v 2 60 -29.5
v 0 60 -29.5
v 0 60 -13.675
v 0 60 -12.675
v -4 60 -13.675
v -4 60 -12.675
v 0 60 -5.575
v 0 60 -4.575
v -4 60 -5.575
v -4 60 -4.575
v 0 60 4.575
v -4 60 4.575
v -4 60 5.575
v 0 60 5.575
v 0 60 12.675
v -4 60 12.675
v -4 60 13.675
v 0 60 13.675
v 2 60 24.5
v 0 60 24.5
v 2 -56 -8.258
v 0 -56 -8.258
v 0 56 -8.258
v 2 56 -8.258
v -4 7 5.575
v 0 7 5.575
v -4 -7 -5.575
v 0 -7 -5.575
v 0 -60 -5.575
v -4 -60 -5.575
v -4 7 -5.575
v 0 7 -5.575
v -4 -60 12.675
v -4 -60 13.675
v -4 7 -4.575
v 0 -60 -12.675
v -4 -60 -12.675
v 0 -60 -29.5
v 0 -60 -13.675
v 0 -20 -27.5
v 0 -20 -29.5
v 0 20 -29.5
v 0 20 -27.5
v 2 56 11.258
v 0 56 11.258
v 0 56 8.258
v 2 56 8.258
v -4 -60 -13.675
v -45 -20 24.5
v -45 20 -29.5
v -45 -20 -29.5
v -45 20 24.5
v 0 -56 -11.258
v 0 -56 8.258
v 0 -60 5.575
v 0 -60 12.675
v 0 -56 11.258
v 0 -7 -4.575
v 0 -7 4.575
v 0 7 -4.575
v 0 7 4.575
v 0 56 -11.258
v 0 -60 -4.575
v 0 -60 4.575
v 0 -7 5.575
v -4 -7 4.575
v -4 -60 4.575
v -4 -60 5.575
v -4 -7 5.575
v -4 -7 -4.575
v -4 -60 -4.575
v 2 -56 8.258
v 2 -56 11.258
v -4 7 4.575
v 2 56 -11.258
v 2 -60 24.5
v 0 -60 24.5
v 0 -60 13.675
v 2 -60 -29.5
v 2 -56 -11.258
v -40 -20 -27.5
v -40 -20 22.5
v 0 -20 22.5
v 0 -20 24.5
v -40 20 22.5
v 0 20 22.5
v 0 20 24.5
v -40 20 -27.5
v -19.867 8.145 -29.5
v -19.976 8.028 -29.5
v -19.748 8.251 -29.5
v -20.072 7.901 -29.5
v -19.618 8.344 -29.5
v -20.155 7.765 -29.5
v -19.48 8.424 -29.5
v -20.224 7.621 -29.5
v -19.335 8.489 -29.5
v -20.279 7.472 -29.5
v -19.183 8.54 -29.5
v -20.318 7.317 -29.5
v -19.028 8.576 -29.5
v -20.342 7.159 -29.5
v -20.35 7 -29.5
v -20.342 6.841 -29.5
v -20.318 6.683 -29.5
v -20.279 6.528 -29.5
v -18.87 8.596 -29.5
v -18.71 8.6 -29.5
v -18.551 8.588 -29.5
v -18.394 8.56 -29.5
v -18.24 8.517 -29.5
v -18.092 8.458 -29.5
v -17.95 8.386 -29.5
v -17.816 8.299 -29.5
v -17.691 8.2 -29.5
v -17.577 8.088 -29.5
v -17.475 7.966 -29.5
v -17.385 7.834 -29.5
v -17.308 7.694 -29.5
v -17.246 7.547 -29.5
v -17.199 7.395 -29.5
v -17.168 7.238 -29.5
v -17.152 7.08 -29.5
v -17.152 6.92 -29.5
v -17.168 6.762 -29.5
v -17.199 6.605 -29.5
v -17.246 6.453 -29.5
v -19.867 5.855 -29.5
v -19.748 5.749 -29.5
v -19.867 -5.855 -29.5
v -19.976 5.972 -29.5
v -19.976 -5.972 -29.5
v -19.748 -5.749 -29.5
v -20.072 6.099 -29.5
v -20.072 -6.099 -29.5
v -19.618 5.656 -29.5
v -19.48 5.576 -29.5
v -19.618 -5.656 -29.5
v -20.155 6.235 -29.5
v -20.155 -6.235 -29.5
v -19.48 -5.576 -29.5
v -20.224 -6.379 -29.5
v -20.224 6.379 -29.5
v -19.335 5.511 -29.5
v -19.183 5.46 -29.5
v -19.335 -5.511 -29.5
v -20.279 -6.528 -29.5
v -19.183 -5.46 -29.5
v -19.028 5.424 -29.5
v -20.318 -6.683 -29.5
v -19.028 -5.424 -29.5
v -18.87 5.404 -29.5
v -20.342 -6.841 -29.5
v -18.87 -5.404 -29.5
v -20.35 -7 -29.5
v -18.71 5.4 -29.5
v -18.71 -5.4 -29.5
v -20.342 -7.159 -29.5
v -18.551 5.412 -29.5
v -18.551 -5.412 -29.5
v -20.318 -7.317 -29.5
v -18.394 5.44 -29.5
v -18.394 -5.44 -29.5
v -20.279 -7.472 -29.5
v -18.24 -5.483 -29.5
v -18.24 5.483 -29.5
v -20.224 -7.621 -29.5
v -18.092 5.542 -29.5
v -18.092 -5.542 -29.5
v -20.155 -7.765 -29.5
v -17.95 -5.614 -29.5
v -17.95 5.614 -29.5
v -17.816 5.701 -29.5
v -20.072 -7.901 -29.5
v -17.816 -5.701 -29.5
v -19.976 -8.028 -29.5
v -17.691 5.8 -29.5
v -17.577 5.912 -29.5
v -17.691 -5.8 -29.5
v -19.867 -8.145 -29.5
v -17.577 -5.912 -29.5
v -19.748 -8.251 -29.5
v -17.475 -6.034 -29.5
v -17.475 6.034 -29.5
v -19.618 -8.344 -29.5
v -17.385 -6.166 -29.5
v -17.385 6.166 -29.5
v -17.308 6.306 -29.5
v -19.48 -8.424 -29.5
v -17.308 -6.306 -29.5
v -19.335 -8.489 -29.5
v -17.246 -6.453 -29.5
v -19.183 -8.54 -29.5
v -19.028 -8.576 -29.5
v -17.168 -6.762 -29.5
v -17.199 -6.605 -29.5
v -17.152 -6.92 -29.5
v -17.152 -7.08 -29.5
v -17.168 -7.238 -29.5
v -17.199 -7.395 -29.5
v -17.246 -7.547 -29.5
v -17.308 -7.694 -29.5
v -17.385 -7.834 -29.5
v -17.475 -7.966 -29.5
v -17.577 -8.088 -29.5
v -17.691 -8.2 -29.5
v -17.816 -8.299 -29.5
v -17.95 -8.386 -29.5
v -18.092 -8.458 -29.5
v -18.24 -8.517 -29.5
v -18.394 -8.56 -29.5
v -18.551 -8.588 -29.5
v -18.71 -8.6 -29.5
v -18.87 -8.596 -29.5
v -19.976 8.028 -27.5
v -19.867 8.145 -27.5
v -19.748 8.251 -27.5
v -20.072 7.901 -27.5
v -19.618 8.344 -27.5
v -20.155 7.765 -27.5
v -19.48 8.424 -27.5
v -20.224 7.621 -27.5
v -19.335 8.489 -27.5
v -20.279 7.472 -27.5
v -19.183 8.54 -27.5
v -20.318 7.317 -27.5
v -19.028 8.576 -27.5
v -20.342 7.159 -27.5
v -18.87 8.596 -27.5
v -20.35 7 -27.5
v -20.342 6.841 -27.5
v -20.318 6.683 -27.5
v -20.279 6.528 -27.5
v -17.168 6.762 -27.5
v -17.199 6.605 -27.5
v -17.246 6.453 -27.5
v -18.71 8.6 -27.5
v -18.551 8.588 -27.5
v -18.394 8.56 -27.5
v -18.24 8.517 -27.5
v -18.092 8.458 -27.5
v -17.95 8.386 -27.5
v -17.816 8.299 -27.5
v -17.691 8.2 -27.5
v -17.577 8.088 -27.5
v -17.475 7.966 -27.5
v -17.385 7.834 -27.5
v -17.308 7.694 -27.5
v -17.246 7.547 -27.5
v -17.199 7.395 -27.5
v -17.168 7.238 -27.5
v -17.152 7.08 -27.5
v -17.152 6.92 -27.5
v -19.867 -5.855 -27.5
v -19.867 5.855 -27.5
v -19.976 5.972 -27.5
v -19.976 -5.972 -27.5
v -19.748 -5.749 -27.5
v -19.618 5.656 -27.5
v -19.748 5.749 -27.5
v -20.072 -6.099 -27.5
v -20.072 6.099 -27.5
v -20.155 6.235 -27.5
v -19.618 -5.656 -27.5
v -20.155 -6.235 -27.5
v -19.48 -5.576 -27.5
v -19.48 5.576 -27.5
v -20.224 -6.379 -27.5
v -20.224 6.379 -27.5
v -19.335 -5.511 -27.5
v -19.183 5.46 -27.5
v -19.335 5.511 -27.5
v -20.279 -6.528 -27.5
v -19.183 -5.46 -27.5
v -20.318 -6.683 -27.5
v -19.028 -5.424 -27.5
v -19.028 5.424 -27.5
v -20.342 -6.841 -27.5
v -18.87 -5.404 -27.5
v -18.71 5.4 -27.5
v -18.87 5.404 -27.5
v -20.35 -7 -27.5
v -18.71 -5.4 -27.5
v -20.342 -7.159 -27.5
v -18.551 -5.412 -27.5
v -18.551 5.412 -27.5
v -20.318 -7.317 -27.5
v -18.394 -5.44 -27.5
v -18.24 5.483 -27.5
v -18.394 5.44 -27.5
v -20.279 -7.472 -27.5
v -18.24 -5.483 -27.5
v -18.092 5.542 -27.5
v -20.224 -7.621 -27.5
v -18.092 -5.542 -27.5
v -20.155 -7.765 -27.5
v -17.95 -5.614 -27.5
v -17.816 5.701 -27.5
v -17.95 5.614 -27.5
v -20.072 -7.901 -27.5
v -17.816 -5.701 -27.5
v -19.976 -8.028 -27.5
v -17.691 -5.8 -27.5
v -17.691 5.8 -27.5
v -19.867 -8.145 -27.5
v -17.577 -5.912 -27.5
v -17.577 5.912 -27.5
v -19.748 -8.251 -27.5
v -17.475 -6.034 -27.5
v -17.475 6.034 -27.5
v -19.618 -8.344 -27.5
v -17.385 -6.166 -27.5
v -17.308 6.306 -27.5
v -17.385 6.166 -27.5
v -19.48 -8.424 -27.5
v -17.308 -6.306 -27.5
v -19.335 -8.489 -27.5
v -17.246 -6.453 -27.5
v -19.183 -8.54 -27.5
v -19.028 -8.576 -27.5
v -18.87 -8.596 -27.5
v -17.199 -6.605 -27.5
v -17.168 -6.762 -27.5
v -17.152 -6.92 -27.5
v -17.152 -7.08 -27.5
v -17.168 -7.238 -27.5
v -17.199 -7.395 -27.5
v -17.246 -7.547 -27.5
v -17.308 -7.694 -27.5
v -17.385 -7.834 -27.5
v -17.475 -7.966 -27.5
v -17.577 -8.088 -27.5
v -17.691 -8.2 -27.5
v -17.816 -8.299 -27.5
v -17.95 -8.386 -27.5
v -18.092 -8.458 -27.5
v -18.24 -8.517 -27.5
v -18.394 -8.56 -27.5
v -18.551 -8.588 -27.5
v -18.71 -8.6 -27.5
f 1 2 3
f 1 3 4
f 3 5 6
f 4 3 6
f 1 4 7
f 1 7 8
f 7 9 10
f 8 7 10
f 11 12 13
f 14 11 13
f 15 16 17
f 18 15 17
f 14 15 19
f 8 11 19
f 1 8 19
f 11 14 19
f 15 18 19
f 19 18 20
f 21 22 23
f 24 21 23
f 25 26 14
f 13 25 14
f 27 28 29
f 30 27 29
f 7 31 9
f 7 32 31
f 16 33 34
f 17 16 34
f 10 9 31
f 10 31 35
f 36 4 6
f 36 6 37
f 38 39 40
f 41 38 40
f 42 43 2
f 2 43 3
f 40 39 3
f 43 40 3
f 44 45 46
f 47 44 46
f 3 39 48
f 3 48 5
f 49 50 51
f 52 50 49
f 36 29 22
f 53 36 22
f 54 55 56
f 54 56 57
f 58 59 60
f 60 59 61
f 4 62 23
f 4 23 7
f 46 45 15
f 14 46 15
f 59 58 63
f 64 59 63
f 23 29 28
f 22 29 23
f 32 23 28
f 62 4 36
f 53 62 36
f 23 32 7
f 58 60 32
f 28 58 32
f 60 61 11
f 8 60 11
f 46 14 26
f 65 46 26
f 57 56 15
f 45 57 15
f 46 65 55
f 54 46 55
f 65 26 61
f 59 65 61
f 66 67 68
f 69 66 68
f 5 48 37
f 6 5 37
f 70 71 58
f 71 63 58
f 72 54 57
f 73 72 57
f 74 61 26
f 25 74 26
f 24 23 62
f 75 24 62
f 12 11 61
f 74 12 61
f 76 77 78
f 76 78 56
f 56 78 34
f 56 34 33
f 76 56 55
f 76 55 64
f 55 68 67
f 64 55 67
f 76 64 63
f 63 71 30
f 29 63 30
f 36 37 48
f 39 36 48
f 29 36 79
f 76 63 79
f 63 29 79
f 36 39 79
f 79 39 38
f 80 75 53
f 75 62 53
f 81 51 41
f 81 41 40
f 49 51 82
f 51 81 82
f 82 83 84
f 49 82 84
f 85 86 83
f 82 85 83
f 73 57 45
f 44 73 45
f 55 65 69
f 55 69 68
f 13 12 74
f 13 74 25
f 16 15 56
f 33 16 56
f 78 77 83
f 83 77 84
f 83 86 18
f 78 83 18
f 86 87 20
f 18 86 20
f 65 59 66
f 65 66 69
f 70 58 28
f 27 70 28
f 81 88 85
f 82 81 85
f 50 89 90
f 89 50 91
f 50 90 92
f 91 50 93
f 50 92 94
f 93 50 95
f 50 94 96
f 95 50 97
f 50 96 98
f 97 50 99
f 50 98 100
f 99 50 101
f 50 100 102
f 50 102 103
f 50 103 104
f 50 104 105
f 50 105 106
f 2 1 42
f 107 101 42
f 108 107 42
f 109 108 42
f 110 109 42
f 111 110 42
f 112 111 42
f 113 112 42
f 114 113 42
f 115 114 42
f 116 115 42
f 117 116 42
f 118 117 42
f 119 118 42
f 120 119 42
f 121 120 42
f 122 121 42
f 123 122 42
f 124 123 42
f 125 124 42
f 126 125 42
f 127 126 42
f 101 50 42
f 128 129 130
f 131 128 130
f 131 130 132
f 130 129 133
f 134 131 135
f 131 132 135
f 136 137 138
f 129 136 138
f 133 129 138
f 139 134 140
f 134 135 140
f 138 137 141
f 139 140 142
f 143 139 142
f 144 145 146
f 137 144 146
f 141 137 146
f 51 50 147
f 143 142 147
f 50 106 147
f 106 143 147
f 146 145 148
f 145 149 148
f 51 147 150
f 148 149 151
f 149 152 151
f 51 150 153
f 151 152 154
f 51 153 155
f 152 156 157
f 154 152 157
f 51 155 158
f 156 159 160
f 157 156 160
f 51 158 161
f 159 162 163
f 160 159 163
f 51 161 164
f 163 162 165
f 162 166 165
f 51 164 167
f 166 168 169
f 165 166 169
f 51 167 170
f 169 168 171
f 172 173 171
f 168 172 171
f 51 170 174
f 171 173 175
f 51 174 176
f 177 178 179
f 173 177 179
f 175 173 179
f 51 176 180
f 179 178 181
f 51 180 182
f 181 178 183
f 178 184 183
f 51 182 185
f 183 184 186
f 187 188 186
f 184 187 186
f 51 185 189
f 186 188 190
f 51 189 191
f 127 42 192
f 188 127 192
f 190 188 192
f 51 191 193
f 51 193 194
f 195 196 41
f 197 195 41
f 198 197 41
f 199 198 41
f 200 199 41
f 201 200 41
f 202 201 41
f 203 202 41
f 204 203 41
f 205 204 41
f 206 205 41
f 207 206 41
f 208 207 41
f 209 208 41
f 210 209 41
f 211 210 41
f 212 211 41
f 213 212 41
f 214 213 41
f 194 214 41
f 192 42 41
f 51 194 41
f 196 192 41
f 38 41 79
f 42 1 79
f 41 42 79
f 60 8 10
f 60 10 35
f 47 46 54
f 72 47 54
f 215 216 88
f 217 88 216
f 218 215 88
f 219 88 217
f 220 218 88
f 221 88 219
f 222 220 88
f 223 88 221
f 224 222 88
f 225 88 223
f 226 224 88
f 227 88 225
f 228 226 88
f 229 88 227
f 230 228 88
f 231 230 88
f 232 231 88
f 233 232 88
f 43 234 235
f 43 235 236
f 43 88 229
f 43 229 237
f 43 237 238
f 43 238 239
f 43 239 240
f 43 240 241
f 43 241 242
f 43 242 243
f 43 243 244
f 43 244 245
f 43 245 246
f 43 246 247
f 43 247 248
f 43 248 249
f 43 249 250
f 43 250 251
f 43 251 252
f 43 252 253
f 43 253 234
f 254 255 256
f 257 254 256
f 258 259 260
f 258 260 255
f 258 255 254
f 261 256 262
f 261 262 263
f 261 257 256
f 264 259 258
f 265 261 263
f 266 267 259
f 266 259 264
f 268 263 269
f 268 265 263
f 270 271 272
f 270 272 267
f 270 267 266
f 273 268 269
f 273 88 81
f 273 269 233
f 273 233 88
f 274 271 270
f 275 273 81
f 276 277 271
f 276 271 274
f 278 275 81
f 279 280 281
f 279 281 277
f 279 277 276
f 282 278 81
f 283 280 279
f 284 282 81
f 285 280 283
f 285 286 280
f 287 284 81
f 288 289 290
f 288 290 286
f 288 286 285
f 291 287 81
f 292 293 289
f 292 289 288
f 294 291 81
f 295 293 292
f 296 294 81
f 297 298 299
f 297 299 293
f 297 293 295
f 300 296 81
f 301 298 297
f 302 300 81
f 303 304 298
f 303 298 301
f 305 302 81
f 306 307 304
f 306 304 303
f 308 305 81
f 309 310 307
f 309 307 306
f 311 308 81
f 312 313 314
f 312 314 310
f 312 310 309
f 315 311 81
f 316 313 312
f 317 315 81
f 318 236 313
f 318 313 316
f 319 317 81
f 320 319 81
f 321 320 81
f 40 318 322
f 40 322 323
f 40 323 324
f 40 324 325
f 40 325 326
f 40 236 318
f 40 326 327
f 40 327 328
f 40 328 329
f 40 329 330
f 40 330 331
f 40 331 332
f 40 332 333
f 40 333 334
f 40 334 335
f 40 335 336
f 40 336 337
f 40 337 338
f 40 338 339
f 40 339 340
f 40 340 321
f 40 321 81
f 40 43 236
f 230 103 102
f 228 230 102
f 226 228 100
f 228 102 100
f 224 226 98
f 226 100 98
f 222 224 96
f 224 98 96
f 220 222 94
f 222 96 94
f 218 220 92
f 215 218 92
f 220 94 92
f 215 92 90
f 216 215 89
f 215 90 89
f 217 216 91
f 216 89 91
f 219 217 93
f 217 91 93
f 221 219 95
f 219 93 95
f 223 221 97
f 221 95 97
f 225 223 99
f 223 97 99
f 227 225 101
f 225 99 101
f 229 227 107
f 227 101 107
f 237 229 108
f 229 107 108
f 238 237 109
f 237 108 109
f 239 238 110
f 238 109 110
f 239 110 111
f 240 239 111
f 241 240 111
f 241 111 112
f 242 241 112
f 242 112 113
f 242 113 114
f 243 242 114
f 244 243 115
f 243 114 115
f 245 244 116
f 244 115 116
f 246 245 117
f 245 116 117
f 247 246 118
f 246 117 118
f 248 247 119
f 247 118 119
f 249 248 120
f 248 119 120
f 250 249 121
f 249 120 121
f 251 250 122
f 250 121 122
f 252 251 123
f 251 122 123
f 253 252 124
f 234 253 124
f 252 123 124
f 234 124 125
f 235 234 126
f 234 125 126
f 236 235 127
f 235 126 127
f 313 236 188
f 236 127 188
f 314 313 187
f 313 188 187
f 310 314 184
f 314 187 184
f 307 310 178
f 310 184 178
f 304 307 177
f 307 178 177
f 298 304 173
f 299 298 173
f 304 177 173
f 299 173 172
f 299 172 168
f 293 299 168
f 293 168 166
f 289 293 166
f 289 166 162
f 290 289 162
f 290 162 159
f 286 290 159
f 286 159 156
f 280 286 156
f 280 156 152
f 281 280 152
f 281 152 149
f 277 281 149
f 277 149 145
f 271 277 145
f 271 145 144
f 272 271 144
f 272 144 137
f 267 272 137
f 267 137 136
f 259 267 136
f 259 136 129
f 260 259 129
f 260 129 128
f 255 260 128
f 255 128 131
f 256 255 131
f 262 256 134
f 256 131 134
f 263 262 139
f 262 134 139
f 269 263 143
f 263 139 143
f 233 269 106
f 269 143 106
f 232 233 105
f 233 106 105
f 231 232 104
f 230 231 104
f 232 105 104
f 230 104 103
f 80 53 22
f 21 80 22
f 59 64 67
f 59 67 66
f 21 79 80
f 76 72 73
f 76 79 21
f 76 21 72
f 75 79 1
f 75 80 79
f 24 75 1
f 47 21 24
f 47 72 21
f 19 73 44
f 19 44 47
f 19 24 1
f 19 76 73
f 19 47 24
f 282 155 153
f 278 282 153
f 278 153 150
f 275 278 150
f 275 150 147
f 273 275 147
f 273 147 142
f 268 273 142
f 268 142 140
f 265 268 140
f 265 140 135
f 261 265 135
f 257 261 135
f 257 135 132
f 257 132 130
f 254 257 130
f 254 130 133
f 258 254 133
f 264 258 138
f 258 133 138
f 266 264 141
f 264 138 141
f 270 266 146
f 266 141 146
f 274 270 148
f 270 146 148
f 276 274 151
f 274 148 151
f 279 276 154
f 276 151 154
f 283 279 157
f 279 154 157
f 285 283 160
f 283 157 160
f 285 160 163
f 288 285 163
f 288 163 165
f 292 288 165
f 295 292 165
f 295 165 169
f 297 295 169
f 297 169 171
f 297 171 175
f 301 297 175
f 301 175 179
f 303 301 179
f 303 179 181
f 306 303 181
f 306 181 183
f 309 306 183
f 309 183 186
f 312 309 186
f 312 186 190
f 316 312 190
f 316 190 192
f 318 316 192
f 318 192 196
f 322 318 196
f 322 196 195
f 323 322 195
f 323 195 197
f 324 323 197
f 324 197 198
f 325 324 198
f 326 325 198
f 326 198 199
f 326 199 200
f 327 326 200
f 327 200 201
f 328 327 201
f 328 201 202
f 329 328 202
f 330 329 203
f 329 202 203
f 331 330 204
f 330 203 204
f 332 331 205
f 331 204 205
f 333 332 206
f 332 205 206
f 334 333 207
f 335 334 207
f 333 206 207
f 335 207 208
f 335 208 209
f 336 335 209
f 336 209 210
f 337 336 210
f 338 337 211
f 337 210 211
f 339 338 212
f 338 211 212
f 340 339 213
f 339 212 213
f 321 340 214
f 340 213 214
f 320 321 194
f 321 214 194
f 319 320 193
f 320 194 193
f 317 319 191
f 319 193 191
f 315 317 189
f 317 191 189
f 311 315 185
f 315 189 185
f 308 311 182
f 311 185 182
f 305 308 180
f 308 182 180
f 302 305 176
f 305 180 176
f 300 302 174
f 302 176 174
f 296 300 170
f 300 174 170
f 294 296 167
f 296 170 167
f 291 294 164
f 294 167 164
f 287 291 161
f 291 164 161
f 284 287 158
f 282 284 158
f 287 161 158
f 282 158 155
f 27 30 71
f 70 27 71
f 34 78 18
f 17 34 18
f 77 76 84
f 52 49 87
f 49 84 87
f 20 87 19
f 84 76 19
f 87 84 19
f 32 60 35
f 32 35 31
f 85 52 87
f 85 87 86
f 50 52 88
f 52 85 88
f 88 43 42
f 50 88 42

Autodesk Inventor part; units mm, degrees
ref_plane "YZ Plane" through (0, 0, 0) normal (1, 0, 0) x (0, 1, 0)
ref_plane "XZ Plane" through (0, 0, 0) normal (0, 1, 0) x (-1, 0, 0)
ref_plane "XY Plane" through (0, 0, 0) normal (0, 0, 1) x (1, 0, 0)
sketch "スケッチ1" plane through (0, 0, 0) normal (1, 0, 0) x (0, 1, 0)
  line L0 (60, -13.675) -> (-60, -13.675)
  line L1 (-60, -13.675) -> (-60, 13.675)
  line L2 (-60, 13.675) -> (60, 13.675)
  line L3 (60, 13.675) -> (60, -13.675)
  line L4 (60, -13.675) -> (-60, 13.675) construction
  line L5 (-60, -13.675) -> (60, 13.675) construction
  line L6 (-56, 11.258) -> (56, 11.258)
  line L7 (56, 11.258) -> (56, 8.258)
  line L8 (56, 8.258) -> (-56, 8.258)
  line L9 (-56, 8.258) -> (-56, 11.258)
  line L10 (-56, -8.258) -> (56, -8.258)
  line L11 (56, -8.258) -> (56, -11.258)
  line L12 (56, -11.258) -> (-56, -11.258)
  line L13 (-56, -11.258) -> (-56, -8.258)
  line L14 (60, -13.675) -> (-60, -13.675)
  line L15 (-60, -13.675) -> (-60, -29.5)
  line L16 (-60, -29.5) -> (60, -29.5)
  line L17 (60, -29.5) -> (60, -13.675)
  line L18 (-60, 13.675) -> (60, 13.675)
  line L19 (60, 13.675) -> (60, 24.5)
  line L20 (60, 24.5) -> (-60, 24.5)
  line L21 (-60, 24.5) -> (-60, 13.675)
  point P0 (0, 0)
  point P1 (0, 0)
  point P2 (56, 9.758)
  point P3 (56, -9.758)
  point P4 (0, 0)
  dimension "d1" = 120
  dimension "d3" = 9.758
  dimension "d6" = 3
  dimension "d11" = 9.758
  dimension "d15" = 2.417
  dimension "d26" = 4
  dimension "d27" = 4
  dimension "d41" = 29.5
  dimension "d53" = 54
extrude "押し出し1" add sketch "スケッチ1" along normal blind 2
sketch "スケッチ3" plane through (0, 0, 0) normal (-1, 0, 0) x (0, 0, 1)
  line L0 (-29.5, 60) -> (24.5, 60) projected
  line L1 (5.575, 60) -> (4.575, 60)
  line L2 (4.575, 60) -> (4.575, 7)
  line L3 (4.575, 7) -> (5.575, 7)
  line L4 (5.575, 7) -> (5.575, 60)
  line L5 (13.675, 60) -> (12.675, 60)
  line L6 (12.675, 60) -> (12.675, 0)
  line L7 (12.675, 0) -> (13.675, 0)
  line L8 (13.675, 0) -> (13.675, 60)
  line L9 (0, 0) -> (4.575, 0)
  line L10 (0, 0) -> (0, 19.0491)
  line L11 (5.575, -60) -> (4.575, -60)
  line L12 (4.575, -60) -> (4.575, -7)
  line L13 (4.575, -7) -> (5.575, -7)
  line L14 (5.575, -7) -> (5.575, -60)
  line L15 (13.675, -60) -> (12.675, -60)
  line L16 (12.675, -60) -> (12.675, 0)
  line L17 (13.675, 0) -> (13.675, -60)
  line L18 (-5.575, 60) -> (-4.575, 60)
  line L19 (-4.575, 60) -> (-4.575, 7)
  line L20 (-4.575, 7) -> (-5.575, 7)
  line L21 (-5.575, 7) -> (-5.575, 60)
  line L22 (-13.675, 60) -> (-12.675, 60)
  line L23 (-12.675, 60) -> (-12.675, 0)
  line L24 (-12.675, 0) -> (-13.675, 0)
  line L25 (-13.675, 0) -> (-13.675, 60)
  line L26 (-5.575, -60) -> (-4.575, -60)
  line L27 (-4.575, -60) -> (-4.575, -7)
  line L28 (-4.575, -7) -> (-5.575, -7)
  line L29 (-5.575, -7) -> (-5.575, -60)
  line L30 (-13.675, -60) -> (-12.675, -60)
  line L31 (-12.675, -60) -> (-12.675, 0)
  line L32 (-13.675, 0) -> (-13.675, -60)
  dimension "d31" = 1
  dimension "d33" = 1
  dimension "d34" = 60
  dimension "d35" = 7.1
  dimension "d36" = 7
  dimension "d54" = 13.675
extrude "押し出し4" add sketch "スケッチ3" along normal blind 4
sketch "スケッチ5" plane through (0, 0, 0) normal (-1, 0, 0) x (0, 0, 1)
  line L0 (-29.5, -60) -> (-29.5, 60) projected
  line L1 (-29.5, 20) -> (-27.5, 20)
  line L2 (-27.5, 20) -> (-27.5, -20)
  line L3 (-27.5, -20) -> (-29.5, -20)
  line L4 (-29.5, -20) -> (-29.5, 60)
  line L5 (24.5, 60) -> (24.5, -60) projected
  line L6 (24.5, 20) -> (22.5, 20)
  line L7 (22.5, 20) -> (22.5, -20)
  line L8 (22.5, -20) -> (24.5, -20)
  line L9 (24.5, -20) -> (24.5, 20)
  point P0 (0, 0)
  point P1 (-29.5, -20)
  dimension "d42" = 2
  dimension "d55" = 20
  dimension "d56" = 20
  dimension "d57" = 2
extrude "押し出し5" add sketch "スケッチ5" along normal blind 40
sketch "スケッチ6" plane through (2, -60, -29.5) normal (0, 0, -1) x (-1, 0, 0)
  circle A0 centre (20.75, 67) radius 1.6
  circle A1 centre (20.75, 53) radius 1.6
  line L0 (0, 0) -> (0, 120) projected
  point P0 (2, 60)
  point P1 (0, 60)
  dimension "d45" = 3.2
  dimension "d46" = 3.2
  dimension "d47" = 14
  dimension "d48" = 7
  dimension "d49" = 20.75
  dimension "d50" = 20.75
extrude "押し出し6" cut sketch "スケッチ6" against normal blind 2
sketch "スケッチ7" plane through (-40, 0, 0) normal (-1, 0, 0) x (0, 0, 1)
  line L0 (24.5, 20) -> (22.5, 20) projected
  line L1 (-29.5, 20) -> (-29.5, -20) projected
  line L2 (24.5, 20) -> (-29.5, 20)
  line L3 (-29.5, 20) -> (-29.5, -20)
  line L4 (-29.5, -20) -> (24.5, -20)
  line L5 (24.5, -20) -> (24.5, 20)
  point P0 (0, 0)
extrude "押し出し7" add sketch "スケッチ7" along normal blind 5
equation "\"d3\" = d11"
equation "\"d55\" = d56"
equation "\"d2\" = 0.25 * d0"
equation "\"d0\" = 30"
